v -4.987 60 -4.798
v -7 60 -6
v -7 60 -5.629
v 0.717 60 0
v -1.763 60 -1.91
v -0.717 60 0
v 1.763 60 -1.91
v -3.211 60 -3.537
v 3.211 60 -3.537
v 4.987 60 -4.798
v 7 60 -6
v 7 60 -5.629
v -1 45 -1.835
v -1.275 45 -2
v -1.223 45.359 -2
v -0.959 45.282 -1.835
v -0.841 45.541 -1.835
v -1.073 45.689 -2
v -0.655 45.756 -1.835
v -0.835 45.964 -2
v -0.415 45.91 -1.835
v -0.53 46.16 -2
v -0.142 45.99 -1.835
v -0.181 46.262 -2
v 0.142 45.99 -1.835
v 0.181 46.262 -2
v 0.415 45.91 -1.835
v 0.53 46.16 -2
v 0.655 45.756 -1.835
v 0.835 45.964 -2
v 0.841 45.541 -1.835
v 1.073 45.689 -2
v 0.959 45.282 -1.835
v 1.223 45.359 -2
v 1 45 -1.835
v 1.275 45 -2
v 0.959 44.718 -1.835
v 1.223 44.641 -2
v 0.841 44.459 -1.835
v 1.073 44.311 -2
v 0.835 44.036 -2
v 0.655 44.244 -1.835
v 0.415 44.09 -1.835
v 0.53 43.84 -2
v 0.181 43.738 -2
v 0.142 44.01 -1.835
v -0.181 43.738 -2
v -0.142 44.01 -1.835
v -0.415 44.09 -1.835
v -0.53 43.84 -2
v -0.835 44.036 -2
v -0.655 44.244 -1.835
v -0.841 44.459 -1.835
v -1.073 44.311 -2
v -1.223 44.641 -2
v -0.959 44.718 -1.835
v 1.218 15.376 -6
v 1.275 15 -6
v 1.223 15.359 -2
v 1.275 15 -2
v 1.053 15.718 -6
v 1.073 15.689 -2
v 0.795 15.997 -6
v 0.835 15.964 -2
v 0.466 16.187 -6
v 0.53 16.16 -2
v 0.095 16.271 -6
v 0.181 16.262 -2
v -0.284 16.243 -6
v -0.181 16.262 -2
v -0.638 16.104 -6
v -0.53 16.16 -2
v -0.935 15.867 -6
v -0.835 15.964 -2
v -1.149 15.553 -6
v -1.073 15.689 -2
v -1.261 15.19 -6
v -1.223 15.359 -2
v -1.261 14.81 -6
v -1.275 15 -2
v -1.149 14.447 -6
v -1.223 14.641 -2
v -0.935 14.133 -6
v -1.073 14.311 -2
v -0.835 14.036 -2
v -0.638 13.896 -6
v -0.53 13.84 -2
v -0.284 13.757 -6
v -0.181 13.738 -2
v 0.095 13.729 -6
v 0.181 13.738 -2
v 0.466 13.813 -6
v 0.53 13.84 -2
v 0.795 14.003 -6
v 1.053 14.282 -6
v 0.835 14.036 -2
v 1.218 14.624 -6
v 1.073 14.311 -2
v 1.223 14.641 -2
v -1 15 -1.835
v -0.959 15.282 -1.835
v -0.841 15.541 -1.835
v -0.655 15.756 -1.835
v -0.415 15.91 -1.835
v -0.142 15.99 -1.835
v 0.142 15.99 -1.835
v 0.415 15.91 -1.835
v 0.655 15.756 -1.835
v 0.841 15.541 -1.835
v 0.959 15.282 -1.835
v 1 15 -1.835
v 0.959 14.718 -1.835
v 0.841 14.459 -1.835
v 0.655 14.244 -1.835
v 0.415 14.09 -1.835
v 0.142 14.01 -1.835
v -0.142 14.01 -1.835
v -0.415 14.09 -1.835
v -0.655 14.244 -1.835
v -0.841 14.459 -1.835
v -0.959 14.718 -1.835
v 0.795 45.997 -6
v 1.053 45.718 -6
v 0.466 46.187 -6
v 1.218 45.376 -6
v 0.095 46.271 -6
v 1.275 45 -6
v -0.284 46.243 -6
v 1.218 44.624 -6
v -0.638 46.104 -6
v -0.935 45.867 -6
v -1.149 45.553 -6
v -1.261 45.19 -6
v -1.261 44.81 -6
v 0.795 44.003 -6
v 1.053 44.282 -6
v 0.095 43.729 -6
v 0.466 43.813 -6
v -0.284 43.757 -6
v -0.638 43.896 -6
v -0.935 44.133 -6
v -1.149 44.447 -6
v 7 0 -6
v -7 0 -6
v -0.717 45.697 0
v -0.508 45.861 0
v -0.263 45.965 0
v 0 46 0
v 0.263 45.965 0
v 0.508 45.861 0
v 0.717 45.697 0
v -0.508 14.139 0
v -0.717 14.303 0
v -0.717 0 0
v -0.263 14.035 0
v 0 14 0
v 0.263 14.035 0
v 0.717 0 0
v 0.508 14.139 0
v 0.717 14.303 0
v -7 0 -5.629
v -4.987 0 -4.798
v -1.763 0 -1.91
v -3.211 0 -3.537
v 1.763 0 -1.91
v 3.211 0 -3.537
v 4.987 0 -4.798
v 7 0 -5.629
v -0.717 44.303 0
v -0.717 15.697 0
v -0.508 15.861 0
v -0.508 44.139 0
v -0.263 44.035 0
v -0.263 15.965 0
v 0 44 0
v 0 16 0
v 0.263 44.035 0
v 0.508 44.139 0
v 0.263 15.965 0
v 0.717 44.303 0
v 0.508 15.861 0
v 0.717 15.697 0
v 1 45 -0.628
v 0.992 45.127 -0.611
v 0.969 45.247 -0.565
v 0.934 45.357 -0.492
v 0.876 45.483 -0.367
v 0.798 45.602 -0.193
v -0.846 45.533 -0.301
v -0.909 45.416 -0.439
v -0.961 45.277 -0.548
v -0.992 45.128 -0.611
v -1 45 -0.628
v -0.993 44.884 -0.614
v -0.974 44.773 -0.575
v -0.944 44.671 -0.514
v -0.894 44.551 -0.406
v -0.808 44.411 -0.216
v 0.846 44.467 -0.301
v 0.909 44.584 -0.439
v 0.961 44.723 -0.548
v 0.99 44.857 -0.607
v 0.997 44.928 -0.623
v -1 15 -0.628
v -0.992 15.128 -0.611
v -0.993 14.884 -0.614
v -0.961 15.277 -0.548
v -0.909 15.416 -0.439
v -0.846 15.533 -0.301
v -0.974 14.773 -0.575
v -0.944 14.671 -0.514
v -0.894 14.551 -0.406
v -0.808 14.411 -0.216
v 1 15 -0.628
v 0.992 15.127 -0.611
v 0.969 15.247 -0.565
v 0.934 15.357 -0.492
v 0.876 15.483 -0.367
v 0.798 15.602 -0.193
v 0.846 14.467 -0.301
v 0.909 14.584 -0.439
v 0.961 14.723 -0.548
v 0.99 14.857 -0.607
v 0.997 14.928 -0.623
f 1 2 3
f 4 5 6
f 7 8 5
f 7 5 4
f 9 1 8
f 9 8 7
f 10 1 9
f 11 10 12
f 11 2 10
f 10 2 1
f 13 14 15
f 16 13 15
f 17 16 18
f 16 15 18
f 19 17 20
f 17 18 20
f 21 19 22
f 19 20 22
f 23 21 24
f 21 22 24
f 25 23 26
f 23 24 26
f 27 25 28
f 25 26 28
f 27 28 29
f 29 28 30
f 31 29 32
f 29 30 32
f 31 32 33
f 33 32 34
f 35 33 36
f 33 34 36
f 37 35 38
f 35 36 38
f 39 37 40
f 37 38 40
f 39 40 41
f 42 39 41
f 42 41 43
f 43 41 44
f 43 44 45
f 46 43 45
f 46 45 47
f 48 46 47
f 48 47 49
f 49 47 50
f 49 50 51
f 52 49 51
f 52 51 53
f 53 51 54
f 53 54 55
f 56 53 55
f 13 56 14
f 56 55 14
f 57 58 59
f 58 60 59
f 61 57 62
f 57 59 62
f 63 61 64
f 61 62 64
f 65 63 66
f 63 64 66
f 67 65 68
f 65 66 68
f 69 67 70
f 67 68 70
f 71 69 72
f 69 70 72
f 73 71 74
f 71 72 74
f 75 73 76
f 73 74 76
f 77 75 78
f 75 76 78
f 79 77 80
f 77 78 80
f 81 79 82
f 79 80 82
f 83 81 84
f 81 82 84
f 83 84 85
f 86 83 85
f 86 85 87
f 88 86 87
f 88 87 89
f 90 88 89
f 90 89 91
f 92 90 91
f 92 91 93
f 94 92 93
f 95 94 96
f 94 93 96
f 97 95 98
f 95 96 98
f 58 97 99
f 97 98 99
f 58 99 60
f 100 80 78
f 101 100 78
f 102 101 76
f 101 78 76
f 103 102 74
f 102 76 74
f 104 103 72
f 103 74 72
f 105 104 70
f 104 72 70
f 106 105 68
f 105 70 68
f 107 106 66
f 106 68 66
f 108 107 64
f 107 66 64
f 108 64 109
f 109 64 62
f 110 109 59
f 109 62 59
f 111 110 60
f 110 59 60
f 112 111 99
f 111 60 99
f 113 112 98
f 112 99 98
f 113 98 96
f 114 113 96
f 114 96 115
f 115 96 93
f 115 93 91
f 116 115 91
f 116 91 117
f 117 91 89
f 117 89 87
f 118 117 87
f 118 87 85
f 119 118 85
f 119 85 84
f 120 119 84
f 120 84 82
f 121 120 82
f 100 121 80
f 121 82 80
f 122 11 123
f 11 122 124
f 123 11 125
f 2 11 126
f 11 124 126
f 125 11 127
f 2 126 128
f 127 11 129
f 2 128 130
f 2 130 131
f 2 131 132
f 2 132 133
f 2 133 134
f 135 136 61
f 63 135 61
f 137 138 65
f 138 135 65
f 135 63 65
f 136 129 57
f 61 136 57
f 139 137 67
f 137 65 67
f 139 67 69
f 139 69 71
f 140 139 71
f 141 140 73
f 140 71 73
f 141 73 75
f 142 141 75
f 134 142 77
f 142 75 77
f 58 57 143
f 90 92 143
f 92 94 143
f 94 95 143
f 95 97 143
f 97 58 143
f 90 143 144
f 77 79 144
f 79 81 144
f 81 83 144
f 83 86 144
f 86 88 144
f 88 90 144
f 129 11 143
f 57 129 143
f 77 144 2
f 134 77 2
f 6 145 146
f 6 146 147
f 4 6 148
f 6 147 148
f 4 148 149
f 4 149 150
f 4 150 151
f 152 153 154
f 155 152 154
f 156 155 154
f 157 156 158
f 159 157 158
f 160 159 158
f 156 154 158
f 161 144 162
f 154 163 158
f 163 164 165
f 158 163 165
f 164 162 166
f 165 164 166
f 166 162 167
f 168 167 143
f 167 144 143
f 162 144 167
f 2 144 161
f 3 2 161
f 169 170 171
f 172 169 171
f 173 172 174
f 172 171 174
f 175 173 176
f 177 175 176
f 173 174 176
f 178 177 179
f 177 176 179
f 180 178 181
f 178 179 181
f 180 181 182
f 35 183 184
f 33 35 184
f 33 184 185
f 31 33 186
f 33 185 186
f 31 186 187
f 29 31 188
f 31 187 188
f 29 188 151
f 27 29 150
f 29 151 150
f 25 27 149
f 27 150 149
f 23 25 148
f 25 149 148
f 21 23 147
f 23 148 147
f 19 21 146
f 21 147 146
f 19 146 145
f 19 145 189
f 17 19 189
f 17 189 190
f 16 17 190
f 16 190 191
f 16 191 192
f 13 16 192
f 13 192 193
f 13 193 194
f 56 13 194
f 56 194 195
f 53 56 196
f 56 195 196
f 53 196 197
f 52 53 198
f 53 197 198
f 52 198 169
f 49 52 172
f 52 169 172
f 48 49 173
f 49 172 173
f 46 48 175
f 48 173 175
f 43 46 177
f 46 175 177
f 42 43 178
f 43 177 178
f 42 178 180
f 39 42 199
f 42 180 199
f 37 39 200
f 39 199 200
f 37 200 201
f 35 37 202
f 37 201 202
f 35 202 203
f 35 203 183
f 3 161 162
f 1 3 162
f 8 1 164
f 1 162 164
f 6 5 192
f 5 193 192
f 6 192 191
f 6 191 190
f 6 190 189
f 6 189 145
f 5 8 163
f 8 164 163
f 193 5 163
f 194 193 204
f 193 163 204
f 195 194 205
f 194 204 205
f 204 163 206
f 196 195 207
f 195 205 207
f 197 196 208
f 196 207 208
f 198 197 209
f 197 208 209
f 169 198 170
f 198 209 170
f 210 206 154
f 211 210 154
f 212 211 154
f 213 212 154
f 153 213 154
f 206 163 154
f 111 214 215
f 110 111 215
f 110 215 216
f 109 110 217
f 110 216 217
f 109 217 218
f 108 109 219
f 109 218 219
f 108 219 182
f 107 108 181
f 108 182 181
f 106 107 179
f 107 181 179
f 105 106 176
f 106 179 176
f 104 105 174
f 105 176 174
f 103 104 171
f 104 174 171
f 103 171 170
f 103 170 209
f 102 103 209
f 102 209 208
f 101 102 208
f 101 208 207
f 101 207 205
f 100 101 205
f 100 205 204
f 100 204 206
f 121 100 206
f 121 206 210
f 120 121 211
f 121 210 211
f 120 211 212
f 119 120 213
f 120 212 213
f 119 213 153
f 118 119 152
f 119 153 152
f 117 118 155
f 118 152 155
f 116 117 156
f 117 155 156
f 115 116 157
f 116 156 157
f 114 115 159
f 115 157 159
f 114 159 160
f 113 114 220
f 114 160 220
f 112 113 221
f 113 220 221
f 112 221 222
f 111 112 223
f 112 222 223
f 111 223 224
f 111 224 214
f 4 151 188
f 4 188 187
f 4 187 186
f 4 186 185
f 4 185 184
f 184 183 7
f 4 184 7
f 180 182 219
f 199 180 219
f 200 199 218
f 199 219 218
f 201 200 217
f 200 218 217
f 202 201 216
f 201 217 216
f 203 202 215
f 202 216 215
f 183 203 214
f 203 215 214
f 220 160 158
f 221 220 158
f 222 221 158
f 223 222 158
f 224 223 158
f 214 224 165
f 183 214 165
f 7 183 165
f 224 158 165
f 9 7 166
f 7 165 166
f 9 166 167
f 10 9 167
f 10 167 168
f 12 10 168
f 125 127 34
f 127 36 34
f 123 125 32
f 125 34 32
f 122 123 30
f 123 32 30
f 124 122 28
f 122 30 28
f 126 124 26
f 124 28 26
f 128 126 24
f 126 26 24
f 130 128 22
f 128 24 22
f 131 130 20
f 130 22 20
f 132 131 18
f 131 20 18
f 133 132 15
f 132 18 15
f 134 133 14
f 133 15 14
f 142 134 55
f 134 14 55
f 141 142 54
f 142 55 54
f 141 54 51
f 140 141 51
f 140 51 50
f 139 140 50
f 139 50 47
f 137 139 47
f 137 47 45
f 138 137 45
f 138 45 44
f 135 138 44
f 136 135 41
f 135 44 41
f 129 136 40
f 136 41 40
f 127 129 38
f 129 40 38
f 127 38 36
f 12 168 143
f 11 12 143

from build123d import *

# Parameters (mm, degrees)
BOSS_EXTRUDE1_DEPTH                       = 60
TAPPED_HOLE_FOR_M2_5X0_45_HELICOIL1_D     = 2.55
TAPPED_HOLE_FOR_M2_5X0_45_HELICOIL1_DEPTH = 4
TAPPED_HOLE_FOR_M2_5X0_45_HELICOIL1_TIP   = 0.766097289
F_2_0MM_DOWEL_HOLE1_D                     = 2
F_2_0MM_DOWEL_HOLE1_DEPTH                 = 6.45
F_2_0MM_DOWEL_HOLE1_TIP                   = 0.600860619


with BuildPart() as part:
    # Sketch1 → Boss-Extrude1 (new body)
    with BuildSketch(Plane(origin=(0, 0, 0), x_dir=(1, 0, 0), z_dir=(0, 1, 0))):
        with BuildLine():
            Line((-0.716915426, 0), (0.716915426, 0))
            ThreePointArc((0.716915426, 0), (3.210792252, 3.53742677), (7, 5.629008568))
            Line((7, 5.629008568), (7, 6))
            Line((7, 6), (-7, 6))
            Line((-7, 6), (-7, 5.629008568))
            ThreePointArc((-7, 5.629008568), (-3.210792252, 3.53742677), (-0.716915426, 0))
        make_face()
    extrude(amount=BOSS_EXTRUDE1_DEPTH)

    # Tapped Hole for M2.5x0.45 Helicoil1
    with Locations(Plane(origin=(0, 45, -6), x_dir=(-1, 0, 0), z_dir=(0, 0, -1))):
        with Locations((0, 0), (0, -30)):
            Hole(TAPPED_HOLE_FOR_M2_5X0_45_HELICOIL1_D / 2, depth=TAPPED_HOLE_FOR_M2_5X0_45_HELICOIL1_DEPTH)
            with Locations((0, 0, -(TAPPED_HOLE_FOR_M2_5X0_45_HELICOIL1_DEPTH + TAPPED_HOLE_FOR_M2_5X0_45_HELICOIL1_TIP / 2))):  # 118° drill point
                Cone(0, TAPPED_HOLE_FOR_M2_5X0_45_HELICOIL1_D / 2, TAPPED_HOLE_FOR_M2_5X0_45_HELICOIL1_TIP, mode=Mode.SUBTRACT)

    # Ø2.0mm Dowel Hole1
    with Locations(Plane(origin=(0, 45, -6), x_dir=(-1, 0, 0), z_dir=(0, 0, -1))):
        with Locations((0, 0), (0, -30)):
            Hole(F_2_0MM_DOWEL_HOLE1_D / 2, depth=F_2_0MM_DOWEL_HOLE1_DEPTH)
            with Locations((0, 0, -(F_2_0MM_DOWEL_HOLE1_DEPTH + F_2_0MM_DOWEL_HOLE1_TIP / 2))):  # 118° drill point
                Cone(0, F_2_0MM_DOWEL_HOLE1_D / 2, F_2_0MM_DOWEL_HOLE1_TIP, mode=Mode.SUBTRACT)


solid = part.part
